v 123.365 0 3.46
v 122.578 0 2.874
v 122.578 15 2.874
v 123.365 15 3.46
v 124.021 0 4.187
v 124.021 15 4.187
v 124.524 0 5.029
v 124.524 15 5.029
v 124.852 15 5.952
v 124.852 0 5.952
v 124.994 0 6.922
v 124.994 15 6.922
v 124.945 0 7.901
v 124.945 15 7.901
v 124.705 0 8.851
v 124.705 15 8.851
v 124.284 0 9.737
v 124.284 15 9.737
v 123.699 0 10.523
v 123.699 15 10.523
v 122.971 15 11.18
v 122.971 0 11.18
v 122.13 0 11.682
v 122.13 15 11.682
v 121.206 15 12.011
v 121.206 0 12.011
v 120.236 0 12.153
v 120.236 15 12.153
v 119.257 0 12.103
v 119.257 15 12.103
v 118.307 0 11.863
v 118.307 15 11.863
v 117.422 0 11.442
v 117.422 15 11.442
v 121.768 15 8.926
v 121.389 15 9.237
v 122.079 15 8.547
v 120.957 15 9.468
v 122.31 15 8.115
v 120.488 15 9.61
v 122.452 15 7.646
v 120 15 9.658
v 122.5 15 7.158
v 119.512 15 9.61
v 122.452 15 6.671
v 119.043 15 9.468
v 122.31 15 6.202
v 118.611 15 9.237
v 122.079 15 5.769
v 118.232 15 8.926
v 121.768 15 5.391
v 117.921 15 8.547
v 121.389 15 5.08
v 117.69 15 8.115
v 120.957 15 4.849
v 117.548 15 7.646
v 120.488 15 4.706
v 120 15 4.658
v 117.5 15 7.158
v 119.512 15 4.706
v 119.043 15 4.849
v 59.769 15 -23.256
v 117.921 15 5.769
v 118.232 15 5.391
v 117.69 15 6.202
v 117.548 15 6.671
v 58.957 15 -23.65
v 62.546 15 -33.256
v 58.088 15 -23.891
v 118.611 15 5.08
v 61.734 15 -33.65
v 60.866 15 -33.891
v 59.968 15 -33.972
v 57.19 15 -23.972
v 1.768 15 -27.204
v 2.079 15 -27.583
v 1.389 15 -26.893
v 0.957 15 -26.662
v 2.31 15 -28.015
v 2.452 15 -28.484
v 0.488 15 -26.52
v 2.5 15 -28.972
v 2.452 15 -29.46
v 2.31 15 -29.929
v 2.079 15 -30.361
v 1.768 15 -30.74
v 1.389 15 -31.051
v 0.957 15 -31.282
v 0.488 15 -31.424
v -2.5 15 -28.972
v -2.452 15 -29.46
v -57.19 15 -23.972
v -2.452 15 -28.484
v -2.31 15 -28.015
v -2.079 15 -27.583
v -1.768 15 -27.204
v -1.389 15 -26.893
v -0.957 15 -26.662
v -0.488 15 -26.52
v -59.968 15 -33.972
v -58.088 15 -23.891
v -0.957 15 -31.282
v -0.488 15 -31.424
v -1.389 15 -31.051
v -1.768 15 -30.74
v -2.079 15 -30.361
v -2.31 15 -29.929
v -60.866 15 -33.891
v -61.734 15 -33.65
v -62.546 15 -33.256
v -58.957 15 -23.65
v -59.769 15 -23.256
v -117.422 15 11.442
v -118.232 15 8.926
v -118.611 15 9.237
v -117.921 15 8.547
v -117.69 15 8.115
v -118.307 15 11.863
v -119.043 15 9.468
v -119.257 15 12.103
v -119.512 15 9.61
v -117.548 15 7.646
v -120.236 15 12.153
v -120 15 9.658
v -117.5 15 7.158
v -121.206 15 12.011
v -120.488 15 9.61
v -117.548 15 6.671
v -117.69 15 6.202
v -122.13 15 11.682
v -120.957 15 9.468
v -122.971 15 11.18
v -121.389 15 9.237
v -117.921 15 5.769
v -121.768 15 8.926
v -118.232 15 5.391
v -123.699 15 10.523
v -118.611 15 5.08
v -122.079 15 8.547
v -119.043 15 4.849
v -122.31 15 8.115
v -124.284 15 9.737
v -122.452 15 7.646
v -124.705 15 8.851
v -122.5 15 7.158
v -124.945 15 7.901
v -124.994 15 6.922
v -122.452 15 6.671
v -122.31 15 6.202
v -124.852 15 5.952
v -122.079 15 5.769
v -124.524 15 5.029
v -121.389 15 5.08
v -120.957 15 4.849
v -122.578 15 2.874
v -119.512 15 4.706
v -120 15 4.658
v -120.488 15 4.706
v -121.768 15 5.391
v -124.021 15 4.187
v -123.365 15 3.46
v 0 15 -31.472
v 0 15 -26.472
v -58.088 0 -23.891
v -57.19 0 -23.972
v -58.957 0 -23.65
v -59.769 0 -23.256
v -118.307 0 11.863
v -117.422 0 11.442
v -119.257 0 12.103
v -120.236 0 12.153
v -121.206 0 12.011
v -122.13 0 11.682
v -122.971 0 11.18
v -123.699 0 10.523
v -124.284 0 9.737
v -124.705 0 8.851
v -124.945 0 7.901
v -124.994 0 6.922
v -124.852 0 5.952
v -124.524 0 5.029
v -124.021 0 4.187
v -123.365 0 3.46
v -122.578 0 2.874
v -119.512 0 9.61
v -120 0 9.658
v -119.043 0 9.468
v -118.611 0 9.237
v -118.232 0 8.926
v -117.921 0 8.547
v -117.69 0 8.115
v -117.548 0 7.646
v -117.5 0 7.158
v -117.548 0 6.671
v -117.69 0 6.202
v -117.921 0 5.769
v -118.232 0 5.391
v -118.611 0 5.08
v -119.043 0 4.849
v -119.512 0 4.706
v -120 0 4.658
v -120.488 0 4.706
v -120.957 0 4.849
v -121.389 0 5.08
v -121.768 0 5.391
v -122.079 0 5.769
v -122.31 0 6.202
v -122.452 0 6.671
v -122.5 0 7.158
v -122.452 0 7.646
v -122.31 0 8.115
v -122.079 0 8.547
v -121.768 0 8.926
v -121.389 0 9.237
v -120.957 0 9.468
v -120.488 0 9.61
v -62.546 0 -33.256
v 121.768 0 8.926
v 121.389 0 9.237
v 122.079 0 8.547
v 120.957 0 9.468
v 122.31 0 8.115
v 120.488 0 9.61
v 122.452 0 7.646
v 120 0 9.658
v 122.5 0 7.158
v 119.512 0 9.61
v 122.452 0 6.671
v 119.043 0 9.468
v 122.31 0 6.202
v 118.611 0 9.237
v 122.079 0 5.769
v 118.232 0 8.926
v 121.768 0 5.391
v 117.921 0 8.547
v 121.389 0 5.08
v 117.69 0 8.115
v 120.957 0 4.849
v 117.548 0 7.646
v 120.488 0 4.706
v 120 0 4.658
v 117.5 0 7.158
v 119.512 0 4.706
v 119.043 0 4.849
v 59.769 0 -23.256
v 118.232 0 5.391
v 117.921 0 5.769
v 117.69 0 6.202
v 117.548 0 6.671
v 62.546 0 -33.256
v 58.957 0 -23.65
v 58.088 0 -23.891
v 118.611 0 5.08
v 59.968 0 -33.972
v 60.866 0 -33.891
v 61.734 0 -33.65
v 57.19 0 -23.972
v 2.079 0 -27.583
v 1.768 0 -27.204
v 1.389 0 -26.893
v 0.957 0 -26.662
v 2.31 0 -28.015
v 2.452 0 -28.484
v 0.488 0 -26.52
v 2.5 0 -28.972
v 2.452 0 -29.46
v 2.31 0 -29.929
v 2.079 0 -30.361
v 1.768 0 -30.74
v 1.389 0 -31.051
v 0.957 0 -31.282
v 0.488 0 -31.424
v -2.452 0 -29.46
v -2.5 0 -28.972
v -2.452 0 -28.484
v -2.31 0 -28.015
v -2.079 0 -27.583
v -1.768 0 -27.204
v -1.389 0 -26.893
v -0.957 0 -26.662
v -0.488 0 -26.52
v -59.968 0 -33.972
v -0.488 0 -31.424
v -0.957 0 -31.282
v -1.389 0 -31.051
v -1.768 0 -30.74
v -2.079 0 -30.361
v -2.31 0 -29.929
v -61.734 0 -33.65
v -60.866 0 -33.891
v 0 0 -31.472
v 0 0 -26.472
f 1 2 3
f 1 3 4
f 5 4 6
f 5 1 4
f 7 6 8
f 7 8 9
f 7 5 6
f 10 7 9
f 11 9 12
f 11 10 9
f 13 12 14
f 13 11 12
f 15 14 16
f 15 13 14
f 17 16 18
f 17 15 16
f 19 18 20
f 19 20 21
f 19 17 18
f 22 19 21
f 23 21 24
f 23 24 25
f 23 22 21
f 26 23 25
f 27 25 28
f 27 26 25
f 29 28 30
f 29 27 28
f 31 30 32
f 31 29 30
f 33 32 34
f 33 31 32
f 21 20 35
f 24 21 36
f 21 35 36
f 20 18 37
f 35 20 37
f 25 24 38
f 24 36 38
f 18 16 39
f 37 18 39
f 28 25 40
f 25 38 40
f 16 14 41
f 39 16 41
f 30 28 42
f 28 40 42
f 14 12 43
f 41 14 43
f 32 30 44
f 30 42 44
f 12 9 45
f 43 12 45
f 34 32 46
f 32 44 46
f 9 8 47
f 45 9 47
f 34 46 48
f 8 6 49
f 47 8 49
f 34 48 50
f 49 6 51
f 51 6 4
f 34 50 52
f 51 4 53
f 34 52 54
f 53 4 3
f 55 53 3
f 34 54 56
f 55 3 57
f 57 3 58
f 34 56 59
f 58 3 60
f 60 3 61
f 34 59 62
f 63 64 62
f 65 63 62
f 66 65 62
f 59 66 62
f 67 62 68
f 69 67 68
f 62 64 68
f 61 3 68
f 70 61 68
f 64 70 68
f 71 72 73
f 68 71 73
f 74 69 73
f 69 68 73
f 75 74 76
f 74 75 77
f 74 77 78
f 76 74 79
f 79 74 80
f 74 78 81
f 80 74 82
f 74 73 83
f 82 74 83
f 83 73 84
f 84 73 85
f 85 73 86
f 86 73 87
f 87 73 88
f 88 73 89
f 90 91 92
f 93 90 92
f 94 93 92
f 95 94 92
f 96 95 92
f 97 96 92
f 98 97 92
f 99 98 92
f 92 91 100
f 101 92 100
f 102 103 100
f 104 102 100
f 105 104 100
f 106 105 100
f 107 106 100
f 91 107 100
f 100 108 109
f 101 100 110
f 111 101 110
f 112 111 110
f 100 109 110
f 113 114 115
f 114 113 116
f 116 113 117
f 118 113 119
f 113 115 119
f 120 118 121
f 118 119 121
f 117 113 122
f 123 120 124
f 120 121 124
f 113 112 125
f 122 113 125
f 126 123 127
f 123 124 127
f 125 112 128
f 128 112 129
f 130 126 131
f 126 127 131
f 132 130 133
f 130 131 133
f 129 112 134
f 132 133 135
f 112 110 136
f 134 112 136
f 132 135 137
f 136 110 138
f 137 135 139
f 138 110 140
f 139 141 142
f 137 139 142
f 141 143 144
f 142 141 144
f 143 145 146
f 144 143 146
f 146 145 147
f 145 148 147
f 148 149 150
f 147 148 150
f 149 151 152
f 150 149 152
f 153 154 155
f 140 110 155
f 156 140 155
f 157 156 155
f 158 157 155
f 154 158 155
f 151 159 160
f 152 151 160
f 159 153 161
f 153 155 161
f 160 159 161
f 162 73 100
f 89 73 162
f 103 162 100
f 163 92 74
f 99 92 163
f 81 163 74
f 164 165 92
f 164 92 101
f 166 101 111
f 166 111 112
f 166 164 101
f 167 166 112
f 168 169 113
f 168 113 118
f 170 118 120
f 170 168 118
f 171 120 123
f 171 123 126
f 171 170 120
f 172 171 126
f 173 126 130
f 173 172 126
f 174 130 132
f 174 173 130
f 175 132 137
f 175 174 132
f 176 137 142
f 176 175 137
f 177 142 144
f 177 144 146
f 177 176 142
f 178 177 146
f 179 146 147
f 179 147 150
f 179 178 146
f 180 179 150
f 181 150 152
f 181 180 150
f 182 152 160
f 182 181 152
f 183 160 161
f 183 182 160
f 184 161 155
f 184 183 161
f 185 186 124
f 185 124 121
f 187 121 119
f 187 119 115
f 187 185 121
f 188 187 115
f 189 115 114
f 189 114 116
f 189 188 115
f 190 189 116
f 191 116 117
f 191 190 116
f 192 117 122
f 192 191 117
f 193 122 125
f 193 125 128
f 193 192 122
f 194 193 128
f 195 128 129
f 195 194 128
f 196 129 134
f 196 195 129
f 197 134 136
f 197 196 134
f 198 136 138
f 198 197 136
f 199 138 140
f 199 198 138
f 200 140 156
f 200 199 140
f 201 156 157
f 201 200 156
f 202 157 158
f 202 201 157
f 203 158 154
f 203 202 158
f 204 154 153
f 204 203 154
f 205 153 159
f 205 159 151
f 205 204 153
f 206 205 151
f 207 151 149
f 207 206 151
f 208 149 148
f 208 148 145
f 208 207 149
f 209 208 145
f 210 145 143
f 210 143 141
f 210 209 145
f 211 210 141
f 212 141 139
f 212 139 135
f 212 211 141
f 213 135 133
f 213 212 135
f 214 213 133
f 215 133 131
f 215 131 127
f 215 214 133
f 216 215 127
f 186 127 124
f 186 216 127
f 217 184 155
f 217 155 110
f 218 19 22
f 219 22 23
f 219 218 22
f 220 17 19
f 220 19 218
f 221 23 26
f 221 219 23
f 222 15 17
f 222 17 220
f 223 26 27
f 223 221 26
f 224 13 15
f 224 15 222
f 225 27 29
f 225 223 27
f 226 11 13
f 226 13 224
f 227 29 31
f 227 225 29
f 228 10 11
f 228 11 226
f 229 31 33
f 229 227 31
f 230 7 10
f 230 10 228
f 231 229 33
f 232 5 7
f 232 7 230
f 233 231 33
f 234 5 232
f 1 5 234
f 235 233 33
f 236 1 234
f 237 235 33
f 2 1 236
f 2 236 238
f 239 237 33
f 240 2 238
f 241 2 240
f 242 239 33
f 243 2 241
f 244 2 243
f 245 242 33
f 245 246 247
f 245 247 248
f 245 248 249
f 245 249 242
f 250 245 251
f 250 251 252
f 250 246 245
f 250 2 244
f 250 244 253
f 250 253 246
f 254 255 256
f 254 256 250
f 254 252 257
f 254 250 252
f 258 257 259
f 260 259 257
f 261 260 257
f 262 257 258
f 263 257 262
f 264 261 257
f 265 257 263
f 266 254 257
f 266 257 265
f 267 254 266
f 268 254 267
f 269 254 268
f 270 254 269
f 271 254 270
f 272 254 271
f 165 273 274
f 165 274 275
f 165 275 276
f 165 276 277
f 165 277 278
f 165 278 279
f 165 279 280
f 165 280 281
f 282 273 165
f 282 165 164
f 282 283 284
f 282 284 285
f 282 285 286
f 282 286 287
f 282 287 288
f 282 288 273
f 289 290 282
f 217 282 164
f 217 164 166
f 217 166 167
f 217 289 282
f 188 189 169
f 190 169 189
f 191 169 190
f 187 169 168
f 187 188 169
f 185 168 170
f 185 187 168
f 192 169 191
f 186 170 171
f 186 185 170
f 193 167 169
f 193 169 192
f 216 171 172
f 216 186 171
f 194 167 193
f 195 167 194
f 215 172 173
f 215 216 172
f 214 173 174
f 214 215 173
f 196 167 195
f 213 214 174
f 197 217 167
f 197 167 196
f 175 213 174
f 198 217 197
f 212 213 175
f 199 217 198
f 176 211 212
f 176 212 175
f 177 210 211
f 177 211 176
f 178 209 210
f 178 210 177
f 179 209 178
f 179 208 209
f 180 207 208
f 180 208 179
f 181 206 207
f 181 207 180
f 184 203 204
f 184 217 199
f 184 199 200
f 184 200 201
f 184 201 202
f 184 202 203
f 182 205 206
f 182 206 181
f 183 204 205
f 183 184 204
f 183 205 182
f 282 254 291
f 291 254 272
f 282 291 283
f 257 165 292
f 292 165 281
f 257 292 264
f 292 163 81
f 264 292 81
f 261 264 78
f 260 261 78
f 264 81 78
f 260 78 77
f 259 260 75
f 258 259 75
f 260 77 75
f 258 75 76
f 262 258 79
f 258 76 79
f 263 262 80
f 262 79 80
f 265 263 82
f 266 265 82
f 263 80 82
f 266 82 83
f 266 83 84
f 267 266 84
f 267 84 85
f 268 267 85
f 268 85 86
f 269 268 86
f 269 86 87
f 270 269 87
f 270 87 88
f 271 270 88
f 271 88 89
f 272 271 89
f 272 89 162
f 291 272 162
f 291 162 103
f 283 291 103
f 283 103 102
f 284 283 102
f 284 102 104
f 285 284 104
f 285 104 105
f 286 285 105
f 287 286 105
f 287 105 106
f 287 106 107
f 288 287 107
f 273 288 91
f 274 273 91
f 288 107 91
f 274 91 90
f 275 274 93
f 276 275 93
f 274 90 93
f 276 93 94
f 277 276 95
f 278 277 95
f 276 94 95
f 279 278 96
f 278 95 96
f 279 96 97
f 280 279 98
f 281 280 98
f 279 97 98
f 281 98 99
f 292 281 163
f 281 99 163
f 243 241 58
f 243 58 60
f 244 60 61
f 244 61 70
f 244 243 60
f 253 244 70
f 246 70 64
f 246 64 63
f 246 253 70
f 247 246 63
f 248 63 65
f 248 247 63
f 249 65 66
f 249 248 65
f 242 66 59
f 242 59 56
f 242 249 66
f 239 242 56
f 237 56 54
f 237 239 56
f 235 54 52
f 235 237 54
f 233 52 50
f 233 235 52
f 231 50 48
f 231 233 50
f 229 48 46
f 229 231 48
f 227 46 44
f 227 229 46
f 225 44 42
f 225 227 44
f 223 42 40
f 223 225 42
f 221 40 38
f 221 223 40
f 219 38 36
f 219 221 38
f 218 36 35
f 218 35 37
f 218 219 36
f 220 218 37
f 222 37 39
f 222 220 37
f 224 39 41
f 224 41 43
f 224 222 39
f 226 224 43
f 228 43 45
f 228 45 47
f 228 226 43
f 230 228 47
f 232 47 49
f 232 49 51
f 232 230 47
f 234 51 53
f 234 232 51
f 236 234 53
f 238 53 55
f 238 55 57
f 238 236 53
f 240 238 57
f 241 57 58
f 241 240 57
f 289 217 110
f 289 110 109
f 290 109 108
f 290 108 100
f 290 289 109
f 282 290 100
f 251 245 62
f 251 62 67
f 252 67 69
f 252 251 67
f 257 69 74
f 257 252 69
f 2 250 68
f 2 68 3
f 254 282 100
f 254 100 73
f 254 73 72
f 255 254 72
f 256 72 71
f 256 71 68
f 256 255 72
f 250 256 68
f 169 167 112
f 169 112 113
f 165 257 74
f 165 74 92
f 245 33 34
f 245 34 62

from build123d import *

# Parameters (mm, degrees)
SKETCH1_R           = 2.5
BOSS_EXTRUDE1_DEPTH = 15
SKETCH2_R           = 2.5
CUT_EXTRUDE1_DEPTH  = 20


with BuildPart() as part:
    # Sketch1 → Boss-Extrude1 (new body)
    with BuildSketch(Plane(origin=(0, 0, 0), x_dir=(1, 0, 0), z_dir=(0, 1, 0))):
        with BuildLine():
            Line((-59.967506742, 33.972160861), (59.967506742, 33.972160861))
            ThreePointArc((59.967506742, 33.972160861), (61.305448214, 33.78982758), (62.545809183, 33.256125908))
            Line((62.545809183, 33.256125908), (122.57830244, -2.874403203))
            ThreePointArc((122.57830244, -2.874403203), (124.283965047, -9.736670691), (117.42169756, -11.442333298))
            Line((117.42169756, -11.442333298), (59.768652626, 23.256125908))
            ThreePointArc((59.768652626, 23.256125908), (58.528291658, 23.78982758), (57.190350186, 23.972160861))
            Line((57.190350186, 23.972160861), (-57.190350186, 23.972160861))
            ThreePointArc((-57.190350186, 23.972160861), (-58.528291658, 23.78982758), (-59.768652626, 23.256125908))
            Line((-59.768652626, 23.256125908), (-117.42169756, -11.442333298))
            ThreePointArc((-117.42169756, -11.442333298), (-124.283965047, -9.736670691), (-122.57830244, -2.874403203))
            Line((-122.57830244, -2.874403203), (-62.545809183, 33.256125908))
            ThreePointArc((-62.545809183, 33.256125908), (-61.305448214, 33.78982758), (-59.967506742, 33.972160861))
        make_face()
        with Locations(Location((-120, -7.158368251, 0), (0, 0, 270))):
            Circle(SKETCH1_R, mode=Mode.SUBTRACT)
        with Locations(Location((120, -7.158368251, 0), (0, 0, 90))):
            Circle(SKETCH1_R, mode=Mode.SUBTRACT)
    extrude(amount=BOSS_EXTRUDE1_DEPTH)

    # Sketch2 → Cut-Extrude1 (cut)
    with BuildSketch(Plane(origin=(0, 15, 0), x_dir=(1, 0, 0), z_dir=(0, 1, 0))):
        with Locations(Location((0, 28.972160861, 0), (0, 0, 270))):
            Circle(SKETCH2_R)
    extrude(amount=-CUT_EXTRUDE1_DEPTH, mode=Mode.SUBTRACT)


solid = part.part
